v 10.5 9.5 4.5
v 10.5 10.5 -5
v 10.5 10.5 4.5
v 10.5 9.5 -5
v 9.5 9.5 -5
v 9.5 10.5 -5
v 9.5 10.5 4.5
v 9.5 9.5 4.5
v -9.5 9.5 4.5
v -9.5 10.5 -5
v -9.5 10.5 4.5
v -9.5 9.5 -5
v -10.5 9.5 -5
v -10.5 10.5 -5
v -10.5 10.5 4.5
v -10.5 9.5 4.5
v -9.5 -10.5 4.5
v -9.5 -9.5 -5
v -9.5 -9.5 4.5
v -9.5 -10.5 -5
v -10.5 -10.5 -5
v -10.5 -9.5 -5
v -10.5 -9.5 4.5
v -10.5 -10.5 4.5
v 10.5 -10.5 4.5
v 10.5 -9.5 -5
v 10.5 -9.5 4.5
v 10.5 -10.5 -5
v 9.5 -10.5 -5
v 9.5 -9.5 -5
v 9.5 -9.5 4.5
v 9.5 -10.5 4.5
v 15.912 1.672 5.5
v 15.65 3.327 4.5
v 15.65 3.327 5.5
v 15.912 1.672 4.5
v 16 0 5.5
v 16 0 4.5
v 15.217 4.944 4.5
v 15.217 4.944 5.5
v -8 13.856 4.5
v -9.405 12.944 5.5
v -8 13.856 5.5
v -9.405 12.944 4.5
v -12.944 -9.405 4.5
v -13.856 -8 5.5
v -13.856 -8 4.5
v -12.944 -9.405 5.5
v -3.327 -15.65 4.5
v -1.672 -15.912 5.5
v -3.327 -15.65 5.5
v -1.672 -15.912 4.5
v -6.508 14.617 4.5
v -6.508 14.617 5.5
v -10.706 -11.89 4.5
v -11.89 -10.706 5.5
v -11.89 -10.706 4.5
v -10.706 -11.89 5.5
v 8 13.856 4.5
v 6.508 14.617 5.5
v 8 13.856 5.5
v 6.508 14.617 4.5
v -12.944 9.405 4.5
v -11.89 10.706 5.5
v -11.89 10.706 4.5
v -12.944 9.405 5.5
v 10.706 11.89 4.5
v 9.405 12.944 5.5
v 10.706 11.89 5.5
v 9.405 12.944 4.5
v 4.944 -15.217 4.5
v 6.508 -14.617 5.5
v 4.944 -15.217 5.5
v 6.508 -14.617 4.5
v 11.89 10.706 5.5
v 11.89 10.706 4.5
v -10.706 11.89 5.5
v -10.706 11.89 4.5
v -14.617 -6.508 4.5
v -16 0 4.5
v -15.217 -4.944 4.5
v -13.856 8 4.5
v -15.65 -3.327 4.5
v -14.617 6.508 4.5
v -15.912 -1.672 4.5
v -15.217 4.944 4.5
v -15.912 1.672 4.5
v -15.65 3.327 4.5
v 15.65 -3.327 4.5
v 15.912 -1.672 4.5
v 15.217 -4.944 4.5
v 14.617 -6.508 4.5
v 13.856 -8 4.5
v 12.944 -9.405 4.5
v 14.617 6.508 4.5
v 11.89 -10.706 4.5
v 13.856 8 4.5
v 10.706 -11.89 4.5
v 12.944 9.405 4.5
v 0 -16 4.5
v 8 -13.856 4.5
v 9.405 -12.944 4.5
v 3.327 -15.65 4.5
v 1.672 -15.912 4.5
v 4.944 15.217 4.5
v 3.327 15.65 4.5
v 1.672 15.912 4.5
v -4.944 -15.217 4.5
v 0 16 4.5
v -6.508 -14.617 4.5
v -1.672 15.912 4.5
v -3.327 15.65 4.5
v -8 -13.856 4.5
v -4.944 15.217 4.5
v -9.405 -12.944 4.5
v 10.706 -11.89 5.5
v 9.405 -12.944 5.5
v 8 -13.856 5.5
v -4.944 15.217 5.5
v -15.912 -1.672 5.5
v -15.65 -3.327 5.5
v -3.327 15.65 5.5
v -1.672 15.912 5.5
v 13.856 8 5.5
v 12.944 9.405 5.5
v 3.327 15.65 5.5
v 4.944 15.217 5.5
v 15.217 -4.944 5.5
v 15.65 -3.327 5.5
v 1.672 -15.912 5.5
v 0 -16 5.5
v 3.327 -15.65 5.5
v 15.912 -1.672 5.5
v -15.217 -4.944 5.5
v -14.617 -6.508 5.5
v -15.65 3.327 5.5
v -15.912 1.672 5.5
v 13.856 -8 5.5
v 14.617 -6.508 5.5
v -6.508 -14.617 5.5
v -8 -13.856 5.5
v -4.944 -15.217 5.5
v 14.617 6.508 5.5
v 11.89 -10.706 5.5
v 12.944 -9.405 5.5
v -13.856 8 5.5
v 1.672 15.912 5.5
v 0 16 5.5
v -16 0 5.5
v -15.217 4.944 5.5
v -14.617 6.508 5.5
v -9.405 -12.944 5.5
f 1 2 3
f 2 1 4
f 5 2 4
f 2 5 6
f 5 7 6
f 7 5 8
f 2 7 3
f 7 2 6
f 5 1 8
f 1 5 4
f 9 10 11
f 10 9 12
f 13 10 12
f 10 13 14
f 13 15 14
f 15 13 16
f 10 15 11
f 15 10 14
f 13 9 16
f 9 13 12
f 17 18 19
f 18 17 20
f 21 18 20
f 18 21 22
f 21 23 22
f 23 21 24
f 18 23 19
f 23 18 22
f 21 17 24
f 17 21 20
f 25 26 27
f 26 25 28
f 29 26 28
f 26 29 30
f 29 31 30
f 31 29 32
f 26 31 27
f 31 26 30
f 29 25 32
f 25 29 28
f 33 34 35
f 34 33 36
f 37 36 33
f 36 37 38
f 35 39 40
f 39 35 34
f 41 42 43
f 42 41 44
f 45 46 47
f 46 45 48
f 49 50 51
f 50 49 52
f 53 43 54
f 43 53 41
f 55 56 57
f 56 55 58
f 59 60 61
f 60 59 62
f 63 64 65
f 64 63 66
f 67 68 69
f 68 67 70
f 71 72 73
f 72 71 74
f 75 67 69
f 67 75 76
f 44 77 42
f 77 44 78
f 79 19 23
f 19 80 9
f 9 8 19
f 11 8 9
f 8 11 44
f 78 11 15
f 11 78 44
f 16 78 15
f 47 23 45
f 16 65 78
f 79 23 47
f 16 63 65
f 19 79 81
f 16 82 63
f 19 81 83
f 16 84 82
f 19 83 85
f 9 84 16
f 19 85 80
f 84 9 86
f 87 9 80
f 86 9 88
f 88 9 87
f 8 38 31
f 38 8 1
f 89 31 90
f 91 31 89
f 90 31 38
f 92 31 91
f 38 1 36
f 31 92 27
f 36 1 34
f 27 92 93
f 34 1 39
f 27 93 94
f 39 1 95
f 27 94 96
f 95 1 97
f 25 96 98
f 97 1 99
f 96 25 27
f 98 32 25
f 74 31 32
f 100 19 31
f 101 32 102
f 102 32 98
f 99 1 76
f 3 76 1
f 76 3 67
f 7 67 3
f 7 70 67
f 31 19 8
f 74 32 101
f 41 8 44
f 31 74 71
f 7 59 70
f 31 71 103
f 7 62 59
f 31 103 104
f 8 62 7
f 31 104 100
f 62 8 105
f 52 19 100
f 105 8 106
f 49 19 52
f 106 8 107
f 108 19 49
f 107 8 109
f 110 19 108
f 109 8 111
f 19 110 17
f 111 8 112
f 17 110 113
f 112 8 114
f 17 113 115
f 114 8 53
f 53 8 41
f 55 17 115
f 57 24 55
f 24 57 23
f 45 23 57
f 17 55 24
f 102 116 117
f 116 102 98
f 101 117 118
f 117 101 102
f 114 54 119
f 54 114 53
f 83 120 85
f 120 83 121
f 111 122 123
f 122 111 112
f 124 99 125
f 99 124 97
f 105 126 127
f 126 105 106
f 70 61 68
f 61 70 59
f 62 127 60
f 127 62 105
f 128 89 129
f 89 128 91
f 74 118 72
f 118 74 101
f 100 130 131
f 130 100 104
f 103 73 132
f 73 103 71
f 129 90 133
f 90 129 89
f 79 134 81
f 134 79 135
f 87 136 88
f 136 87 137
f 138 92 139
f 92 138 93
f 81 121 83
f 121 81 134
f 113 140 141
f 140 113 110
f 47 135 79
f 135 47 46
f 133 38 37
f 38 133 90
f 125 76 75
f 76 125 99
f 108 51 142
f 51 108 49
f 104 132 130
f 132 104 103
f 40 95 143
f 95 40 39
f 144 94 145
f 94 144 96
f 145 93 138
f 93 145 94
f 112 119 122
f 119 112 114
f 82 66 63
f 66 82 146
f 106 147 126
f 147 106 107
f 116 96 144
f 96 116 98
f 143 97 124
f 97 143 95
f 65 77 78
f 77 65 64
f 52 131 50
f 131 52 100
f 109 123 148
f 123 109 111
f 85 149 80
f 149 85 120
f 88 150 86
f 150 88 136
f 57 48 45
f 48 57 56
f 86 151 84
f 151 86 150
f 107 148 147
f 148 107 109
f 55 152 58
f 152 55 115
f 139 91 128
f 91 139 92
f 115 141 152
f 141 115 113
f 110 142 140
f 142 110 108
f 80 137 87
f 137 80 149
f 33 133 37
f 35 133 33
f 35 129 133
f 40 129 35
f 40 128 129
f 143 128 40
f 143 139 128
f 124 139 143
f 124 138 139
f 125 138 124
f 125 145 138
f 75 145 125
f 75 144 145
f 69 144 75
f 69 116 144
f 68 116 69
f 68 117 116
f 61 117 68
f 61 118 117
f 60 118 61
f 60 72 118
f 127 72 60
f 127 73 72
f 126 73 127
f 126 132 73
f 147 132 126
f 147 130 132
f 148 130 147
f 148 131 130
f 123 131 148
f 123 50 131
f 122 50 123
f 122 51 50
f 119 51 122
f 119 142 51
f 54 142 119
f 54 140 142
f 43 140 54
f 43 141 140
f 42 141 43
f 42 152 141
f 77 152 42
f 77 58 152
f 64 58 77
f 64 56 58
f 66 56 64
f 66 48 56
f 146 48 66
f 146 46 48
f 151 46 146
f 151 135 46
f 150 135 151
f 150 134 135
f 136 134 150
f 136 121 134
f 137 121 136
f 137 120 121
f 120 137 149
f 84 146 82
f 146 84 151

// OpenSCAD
// Angelo Nicolì 2023 - Licensed GPL-2.0
module Table_Round(){

Table_Leg = [1,1,10];

Leg_Distance_x = 20;
Leg_Distance_y = Leg_Distance_x;
Upper_Part_Size = Leg_Distance_x * 0.8;
Upper_Part_Height = 1;



color("#cdaa7d"){
// Legs 
translate([Leg_Distance_x*0.5,Leg_Distance_y*0.5,0])
cube([Table_Leg[0],Table_Leg[1],Table_Leg[2]],center=true);

translate([-Leg_Distance_x*0.5,Leg_Distance_y*0.5,0])
cube([Table_Leg[0],Table_Leg[1],Table_Leg[2]],center=true);

translate([-Leg_Distance_x*0.5,-Leg_Distance_y*0.5,0])
cube([Table_Leg[0],Table_Leg[1],Table_Leg[2]],center=true);

translate([Leg_Distance_x*0.5,-Leg_Distance_y*0.5,0])
cube([Table_Leg[0],Table_Leg[1],Table_Leg[2]],center=true);

Table_Upper = [Leg_Distance_x+Table_Leg[0],Leg_Distance_y + Table_Leg[1],1];
Table_Height = Table_Leg[2]*0.5;

// Circle
translate([0,0,Table_Height]){
cylinder(r = Upper_Part_Size, h = Upper_Part_Height,$fn = 60 , center=true);
}

}

}

Table_Round();
